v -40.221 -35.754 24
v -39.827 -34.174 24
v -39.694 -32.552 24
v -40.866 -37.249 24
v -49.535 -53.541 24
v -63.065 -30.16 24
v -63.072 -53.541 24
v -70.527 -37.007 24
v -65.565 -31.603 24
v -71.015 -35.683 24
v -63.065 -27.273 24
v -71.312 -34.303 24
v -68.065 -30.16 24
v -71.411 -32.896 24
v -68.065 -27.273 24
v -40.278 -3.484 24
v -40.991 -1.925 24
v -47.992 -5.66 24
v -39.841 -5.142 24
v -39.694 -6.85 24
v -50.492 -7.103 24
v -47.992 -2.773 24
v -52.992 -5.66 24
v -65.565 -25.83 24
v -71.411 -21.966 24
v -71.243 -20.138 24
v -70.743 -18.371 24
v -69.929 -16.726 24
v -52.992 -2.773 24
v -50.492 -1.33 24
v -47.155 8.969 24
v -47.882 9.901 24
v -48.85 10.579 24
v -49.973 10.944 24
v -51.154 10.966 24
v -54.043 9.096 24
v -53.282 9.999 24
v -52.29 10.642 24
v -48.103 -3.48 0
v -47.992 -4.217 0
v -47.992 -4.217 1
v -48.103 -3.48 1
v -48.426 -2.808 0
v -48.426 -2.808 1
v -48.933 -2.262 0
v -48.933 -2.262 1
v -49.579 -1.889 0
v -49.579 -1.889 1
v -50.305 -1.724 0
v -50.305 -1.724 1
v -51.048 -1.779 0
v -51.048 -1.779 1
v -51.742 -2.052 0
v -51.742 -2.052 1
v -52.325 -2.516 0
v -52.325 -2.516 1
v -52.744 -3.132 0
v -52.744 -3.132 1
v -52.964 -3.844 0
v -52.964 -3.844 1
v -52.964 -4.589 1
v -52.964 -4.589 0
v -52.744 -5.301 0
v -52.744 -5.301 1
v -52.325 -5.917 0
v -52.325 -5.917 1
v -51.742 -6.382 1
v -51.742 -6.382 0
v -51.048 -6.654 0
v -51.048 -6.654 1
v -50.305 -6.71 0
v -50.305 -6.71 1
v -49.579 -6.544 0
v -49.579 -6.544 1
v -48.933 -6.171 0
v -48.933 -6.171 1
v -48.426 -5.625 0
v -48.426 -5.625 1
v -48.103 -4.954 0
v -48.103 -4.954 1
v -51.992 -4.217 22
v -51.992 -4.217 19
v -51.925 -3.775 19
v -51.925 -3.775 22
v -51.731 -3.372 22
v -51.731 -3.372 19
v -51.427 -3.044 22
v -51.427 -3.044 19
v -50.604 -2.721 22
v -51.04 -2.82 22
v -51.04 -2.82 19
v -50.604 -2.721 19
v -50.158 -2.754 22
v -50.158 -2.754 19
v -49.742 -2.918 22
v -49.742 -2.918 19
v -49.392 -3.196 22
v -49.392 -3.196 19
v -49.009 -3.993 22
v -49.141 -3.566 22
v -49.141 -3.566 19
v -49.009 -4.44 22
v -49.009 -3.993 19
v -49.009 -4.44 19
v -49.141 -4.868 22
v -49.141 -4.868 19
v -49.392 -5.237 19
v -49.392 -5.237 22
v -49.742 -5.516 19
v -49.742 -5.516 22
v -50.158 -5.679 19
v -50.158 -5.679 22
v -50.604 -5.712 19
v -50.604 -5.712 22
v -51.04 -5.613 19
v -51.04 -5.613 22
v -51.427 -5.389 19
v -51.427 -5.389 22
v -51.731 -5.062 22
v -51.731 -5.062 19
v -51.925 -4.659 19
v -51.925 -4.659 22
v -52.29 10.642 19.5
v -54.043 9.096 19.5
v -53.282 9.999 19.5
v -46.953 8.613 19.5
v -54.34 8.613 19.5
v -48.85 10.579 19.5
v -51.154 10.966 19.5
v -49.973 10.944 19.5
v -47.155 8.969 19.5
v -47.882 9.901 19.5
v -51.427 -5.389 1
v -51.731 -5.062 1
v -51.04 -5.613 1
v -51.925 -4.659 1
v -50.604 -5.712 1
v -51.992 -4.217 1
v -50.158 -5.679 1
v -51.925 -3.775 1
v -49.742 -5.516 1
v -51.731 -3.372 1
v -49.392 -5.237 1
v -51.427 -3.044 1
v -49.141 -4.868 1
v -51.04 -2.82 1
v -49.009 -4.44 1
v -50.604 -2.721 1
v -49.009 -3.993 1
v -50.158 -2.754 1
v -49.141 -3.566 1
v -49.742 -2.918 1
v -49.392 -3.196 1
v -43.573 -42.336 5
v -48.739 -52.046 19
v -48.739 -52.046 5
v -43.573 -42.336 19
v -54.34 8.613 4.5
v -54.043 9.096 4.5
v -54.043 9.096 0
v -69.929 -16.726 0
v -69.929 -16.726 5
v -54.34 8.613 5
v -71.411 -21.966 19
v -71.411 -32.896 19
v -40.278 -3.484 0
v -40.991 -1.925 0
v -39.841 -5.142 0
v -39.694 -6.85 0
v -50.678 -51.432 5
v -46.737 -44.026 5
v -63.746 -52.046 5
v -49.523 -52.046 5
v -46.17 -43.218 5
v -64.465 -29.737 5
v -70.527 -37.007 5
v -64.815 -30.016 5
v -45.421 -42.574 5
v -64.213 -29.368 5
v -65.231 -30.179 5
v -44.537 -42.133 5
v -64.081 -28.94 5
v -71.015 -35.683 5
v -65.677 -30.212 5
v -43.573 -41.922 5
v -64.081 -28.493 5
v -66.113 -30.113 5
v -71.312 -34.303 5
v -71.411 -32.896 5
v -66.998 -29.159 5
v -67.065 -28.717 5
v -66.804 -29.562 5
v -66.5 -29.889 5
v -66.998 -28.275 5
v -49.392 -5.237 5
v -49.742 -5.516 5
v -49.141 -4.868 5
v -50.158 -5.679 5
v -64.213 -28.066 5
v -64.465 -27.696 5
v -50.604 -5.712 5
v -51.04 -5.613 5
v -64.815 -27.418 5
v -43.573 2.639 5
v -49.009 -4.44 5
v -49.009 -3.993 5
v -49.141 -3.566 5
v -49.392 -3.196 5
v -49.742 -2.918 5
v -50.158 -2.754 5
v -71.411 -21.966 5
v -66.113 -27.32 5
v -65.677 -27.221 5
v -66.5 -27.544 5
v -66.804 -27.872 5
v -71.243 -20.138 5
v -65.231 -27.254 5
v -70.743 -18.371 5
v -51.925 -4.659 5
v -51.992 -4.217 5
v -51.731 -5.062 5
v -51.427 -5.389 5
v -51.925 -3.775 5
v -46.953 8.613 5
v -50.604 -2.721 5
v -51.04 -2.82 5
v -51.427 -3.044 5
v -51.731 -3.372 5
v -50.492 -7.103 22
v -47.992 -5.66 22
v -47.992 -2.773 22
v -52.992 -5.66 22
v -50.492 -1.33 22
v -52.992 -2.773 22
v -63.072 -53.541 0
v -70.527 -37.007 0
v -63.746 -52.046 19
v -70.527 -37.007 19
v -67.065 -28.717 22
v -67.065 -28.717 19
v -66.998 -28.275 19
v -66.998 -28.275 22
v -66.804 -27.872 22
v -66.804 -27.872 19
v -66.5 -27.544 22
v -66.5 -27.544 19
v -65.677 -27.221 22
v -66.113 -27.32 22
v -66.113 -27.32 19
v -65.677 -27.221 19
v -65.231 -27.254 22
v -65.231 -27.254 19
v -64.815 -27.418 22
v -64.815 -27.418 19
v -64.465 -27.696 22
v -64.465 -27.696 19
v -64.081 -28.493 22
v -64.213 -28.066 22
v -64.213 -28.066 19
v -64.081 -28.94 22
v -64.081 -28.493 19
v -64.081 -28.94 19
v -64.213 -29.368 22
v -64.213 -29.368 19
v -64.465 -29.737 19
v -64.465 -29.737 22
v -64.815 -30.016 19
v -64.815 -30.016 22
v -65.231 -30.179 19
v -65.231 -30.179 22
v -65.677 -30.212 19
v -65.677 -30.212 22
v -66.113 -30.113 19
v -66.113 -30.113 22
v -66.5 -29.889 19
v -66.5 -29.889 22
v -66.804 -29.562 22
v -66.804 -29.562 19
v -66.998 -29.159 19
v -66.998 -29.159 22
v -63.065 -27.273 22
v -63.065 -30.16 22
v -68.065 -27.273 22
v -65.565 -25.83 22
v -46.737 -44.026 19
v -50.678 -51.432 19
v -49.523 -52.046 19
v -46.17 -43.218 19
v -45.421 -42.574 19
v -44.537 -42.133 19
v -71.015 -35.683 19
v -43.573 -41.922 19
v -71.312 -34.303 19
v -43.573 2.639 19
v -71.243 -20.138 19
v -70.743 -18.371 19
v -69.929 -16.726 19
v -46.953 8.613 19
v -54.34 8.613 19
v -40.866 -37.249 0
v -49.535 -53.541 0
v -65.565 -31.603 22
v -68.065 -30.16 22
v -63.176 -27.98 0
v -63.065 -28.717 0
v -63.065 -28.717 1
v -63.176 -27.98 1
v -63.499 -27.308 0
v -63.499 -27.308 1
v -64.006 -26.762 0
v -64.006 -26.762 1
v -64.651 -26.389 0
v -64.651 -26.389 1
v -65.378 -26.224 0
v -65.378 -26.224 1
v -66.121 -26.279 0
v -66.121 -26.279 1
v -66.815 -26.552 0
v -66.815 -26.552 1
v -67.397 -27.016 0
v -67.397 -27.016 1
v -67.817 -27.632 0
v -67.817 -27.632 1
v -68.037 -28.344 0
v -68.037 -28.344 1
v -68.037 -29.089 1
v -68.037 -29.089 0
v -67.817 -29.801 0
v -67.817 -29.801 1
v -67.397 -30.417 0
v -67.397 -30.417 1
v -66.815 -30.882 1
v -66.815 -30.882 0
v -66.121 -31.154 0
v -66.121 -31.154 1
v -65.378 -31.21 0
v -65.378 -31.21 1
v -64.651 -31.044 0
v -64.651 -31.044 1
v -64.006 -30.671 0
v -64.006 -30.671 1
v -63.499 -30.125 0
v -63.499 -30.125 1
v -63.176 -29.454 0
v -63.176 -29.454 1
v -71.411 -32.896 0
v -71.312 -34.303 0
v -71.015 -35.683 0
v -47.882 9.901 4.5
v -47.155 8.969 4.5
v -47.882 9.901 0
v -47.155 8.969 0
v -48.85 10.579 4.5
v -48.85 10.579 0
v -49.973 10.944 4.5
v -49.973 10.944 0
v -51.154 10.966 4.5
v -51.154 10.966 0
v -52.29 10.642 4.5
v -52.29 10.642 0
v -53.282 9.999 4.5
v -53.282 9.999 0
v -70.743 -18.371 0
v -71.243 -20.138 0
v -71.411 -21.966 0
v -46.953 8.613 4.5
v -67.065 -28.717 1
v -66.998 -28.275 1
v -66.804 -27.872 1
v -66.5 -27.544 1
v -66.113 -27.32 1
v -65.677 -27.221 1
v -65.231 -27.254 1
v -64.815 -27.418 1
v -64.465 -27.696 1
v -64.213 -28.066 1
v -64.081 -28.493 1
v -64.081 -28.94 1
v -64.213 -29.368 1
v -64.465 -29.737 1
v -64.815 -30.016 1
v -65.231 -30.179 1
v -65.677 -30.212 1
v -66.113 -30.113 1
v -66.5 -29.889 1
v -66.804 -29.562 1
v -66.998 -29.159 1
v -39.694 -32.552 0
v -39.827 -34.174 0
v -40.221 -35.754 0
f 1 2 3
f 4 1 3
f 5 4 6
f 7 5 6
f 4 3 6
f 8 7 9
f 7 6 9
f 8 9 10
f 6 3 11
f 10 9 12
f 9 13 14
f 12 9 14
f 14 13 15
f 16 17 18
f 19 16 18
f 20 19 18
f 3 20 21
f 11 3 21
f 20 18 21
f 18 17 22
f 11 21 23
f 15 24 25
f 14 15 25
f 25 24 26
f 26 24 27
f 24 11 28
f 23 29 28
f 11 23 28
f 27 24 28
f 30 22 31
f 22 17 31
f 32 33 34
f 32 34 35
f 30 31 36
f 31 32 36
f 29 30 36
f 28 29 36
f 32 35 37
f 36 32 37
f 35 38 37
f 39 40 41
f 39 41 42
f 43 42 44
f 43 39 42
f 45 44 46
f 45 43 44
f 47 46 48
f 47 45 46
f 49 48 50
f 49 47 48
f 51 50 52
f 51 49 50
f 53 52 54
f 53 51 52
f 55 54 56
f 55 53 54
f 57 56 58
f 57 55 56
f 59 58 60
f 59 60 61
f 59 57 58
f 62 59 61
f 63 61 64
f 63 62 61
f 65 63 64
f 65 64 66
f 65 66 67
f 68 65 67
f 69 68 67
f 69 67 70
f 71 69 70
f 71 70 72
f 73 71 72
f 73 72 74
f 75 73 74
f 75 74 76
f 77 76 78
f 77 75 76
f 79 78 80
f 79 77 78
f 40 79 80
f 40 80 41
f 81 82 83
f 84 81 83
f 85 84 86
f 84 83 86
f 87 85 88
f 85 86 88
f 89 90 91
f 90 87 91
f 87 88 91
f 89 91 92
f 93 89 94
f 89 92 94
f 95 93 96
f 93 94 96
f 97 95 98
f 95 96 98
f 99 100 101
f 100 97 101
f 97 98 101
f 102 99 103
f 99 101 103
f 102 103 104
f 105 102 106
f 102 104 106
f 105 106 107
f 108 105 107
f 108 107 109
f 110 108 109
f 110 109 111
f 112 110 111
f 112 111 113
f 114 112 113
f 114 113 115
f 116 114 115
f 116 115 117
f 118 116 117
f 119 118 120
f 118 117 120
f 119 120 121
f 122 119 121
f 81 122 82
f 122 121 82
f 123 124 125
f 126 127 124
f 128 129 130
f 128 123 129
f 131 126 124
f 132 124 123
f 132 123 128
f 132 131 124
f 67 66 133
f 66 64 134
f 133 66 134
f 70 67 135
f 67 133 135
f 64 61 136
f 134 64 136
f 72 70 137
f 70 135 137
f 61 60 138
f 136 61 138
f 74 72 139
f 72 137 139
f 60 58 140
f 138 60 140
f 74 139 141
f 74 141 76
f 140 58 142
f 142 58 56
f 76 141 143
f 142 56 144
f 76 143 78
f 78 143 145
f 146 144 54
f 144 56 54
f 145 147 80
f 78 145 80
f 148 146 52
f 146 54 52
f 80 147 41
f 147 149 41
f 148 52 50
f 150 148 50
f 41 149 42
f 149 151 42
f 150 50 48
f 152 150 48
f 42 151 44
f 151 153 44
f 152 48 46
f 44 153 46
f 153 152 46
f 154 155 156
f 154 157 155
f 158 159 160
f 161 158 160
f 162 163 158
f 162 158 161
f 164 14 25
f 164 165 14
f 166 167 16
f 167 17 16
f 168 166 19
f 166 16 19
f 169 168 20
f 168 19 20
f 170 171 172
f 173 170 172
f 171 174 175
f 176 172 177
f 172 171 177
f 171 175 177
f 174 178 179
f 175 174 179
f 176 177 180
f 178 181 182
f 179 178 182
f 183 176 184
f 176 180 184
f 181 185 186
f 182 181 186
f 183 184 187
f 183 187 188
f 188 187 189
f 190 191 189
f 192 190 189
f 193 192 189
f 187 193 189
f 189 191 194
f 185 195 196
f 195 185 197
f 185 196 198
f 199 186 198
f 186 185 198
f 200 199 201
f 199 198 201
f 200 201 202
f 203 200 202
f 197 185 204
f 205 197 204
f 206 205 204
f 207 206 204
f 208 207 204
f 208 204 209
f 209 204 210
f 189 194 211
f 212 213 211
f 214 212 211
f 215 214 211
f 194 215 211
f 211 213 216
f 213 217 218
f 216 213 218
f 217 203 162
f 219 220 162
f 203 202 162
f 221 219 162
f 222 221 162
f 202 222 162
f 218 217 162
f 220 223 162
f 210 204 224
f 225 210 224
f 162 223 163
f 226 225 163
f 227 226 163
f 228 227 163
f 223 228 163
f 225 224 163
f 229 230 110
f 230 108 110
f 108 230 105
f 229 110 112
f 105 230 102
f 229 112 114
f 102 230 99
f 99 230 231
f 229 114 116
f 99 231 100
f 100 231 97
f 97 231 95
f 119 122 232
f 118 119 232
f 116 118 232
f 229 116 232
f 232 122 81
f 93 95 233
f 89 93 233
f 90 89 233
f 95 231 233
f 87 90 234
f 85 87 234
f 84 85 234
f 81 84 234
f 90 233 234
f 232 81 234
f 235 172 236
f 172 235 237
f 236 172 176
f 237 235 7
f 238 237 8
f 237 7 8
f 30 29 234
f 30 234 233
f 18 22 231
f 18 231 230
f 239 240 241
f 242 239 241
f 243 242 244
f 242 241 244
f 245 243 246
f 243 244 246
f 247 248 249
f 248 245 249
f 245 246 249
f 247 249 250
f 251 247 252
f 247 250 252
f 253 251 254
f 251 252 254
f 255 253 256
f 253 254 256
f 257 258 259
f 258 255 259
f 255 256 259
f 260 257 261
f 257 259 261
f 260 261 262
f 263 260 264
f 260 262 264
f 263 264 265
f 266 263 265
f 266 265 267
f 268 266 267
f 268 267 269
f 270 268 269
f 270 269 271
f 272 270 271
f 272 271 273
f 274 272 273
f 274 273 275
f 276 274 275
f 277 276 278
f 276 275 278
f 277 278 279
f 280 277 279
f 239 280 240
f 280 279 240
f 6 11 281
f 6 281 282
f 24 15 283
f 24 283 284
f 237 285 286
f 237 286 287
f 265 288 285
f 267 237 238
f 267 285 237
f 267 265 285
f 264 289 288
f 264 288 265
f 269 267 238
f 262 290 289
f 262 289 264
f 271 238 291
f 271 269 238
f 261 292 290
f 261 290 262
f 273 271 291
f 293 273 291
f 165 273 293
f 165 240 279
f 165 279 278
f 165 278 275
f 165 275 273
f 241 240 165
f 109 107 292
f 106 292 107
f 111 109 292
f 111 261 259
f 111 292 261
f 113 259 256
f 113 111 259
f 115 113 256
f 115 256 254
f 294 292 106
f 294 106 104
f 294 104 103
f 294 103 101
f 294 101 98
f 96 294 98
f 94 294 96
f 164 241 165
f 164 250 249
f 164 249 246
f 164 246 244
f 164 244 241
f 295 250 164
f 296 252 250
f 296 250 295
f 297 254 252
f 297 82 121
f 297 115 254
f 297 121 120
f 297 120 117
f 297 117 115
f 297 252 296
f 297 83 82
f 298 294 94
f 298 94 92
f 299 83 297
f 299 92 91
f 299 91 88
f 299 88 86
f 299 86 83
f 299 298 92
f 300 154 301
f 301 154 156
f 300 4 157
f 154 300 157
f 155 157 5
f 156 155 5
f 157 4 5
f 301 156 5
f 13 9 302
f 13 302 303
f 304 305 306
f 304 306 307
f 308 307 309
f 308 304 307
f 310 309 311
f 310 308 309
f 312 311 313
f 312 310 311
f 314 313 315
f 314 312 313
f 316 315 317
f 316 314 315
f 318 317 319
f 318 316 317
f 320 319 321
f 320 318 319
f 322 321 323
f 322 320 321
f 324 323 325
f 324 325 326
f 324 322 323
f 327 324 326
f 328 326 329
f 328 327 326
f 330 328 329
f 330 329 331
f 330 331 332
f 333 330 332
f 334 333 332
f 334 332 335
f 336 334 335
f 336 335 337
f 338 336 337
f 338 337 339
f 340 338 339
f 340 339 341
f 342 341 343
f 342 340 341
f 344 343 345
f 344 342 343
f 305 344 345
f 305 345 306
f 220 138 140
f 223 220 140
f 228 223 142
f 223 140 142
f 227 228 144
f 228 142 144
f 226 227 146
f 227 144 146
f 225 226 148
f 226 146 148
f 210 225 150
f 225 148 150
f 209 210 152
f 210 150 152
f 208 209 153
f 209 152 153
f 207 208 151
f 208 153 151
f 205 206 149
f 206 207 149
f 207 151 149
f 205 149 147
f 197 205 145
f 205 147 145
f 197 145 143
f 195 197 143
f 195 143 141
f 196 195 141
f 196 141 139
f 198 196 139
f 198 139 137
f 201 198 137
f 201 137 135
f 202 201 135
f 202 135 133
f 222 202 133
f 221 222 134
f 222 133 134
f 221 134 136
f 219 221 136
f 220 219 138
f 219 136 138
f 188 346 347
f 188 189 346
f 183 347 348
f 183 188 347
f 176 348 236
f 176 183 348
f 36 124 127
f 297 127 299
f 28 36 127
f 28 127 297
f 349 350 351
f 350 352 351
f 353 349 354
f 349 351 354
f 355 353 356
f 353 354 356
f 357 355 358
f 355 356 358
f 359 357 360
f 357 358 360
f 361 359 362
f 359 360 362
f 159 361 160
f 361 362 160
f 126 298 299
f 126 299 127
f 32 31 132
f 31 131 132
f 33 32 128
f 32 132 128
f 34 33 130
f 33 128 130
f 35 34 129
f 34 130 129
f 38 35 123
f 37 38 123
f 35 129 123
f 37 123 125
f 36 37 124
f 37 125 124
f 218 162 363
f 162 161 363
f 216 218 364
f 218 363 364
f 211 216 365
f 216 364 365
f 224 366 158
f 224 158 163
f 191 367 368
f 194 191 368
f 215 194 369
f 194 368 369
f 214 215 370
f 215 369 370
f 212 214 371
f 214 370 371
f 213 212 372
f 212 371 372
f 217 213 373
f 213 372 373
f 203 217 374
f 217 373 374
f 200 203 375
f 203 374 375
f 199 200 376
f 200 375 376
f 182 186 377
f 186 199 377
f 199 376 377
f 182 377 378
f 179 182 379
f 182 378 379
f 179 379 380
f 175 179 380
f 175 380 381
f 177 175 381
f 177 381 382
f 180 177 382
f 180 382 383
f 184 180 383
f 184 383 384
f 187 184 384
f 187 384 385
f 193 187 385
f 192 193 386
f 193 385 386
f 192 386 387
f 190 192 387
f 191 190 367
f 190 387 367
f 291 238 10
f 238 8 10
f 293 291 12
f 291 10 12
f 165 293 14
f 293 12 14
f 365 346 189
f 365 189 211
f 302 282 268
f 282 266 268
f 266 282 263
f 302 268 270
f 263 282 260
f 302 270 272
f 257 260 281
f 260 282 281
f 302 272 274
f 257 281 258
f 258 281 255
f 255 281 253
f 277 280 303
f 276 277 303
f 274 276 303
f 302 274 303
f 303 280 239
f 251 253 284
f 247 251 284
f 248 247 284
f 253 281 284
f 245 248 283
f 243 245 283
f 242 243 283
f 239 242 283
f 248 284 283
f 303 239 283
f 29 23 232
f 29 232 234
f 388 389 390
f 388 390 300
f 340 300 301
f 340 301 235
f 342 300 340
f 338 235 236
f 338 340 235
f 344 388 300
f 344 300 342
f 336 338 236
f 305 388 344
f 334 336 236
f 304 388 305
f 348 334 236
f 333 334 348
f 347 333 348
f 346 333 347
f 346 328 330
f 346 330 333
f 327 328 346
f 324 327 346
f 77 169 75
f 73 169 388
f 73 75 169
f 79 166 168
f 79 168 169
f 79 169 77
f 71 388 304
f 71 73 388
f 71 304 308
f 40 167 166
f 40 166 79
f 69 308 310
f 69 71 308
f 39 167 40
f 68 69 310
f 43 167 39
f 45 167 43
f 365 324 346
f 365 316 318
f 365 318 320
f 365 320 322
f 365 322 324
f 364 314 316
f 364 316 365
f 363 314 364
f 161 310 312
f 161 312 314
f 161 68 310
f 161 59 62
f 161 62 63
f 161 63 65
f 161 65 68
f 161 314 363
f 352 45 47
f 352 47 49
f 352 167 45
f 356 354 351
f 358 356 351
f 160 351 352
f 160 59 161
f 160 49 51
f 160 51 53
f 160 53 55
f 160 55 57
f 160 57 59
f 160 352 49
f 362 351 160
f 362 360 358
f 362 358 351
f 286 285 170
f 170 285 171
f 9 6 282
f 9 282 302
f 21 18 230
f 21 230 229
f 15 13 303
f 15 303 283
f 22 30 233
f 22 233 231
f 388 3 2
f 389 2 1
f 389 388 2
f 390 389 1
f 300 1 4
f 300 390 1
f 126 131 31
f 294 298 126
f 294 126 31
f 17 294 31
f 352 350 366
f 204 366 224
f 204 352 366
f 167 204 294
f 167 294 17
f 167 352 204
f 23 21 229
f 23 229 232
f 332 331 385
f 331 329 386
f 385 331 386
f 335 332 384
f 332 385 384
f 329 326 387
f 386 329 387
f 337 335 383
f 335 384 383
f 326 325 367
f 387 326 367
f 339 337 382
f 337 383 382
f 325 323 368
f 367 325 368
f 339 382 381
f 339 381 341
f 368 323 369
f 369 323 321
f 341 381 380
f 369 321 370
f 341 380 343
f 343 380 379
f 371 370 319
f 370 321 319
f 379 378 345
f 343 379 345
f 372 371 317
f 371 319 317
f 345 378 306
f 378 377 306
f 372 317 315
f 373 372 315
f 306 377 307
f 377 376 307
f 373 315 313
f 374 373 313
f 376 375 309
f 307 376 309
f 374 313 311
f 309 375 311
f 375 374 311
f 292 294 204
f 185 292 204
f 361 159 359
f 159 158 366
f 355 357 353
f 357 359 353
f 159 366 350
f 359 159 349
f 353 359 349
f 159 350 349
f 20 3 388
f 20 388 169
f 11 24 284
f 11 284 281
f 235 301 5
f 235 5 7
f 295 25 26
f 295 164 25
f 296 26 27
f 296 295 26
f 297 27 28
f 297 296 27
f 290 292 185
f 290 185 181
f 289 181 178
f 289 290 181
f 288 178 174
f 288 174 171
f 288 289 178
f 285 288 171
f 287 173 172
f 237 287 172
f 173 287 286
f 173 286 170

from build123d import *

# Parameters (mm, degrees)
SKETCH_1_W           = 41.838517058
SKETCH_1_H           = 61.659283987
SKETCH_1_R           = 1.5
EXTRUDE_1_DEPTH      = 24
SHELL_START          = 5
SHELL_2_OUTLINE_R    = 6.5
SHELL_2_DEPTH        = 14
SKETCH_7_W           = 14
SKETCH_7_H           = 61.659283987
CUT_EXTRUDE_2_DEPTH  = 38
SKETCH_11_W          = 14
SKETCH_11_H          = 61.659283987
EXTRUDE_2_DEPTH      = 14
SKETCH_12_W          = 10.1213772
SKETCH_12_H          = 61.659283987
CUT_EXTRUDE_3_DEPTH  = 52.896145639
CUT_EXTRUDE_5_DEPTH  = 47.819908548
SKETCH_18_W          = 15
SKETCH_18_H          = 18
CUT_EXTRUDE_6_DEPTH  = 54.011520411
EXTRUDE_5_DEPTH      = 24
SKETCH_22_W          = 27.838517058
SKETCH_22_H          = 14
CUT_EXTRUDE_8_DEPTH  = 17
SKETCH_23_W          = 14.991158549
SKETCH_23_H          = 11.73336261
EXTRUDE_8_DEPTH      = 2
FILLET_3_R           = 4
CUT_EXTRUDE_9_DEPTH  = 62.891048756
FILLET_4_R           = 4
FILLET_5_R           = 10
CUT_EXTRUDE_10_DEPTH = 2
SKETCH_26_R          = 2.5
CUT_EXTRUDE_11_DEPTH = 1


# Read off the part's stored shape, not the designer's step: 抽壳2
with BuildPart() as part:
    # 草图1 → 凸台-拉伸1 (new body)
    with BuildSketch(Plane.XY):
        with Locations((-8.896267572, -4.216675009)):
            Rectangle(SKETCH_1_W, SKETCH_1_H)
        with Locations((-8.896267572, -4.21667501)):
            Circle(SKETCH_1_R, mode=Mode.SUBTRACT)
        with Locations((6.176232993, -28.71667501)):
            Circle(SKETCH_1_R, mode=Mode.SUBTRACT)
    extrude(amount=EXTRUDE_1_DEPTH)

    # 抽壳2 outline → 抽壳2 (cut)
    # profile 1 of 2: a face of its own
    with BuildSketch(Plane.XY.offset(SHELL_START)):
        with BuildLine():
            Line((-24.815526101, 26.612966984), (-24.815526101, -35.046317003))
            Line((-24.815526101, -35.046317003), (4.697844602, -35.046317003))
            ThreePointArc((4.697844602, -35.046317003), (1.097738874, -24.659718332), (12.022990957, -25.876706469))
            Line((12.022990957, -25.876706469), (12.022990957, 26.612966984))
            Line((12.022990957, 26.612966984), (-24.815526101, 26.612966984))
        make_face()
        with Locations((-8.896267572, -4.21667501)):
            Circle(SHELL_2_OUTLINE_R, mode=Mode.SUBTRACT)
    # profile 2 of 2: a face of its own
    with BuildSketch(Plane.XY.offset(SHELL_START)):
        with BuildLine():
            ThreePointArc((12.022990957, -31.556643551), (10.23318967, -33.795169129), (7.654621384, -35.046317003))
            Line((7.654621384, -35.046317003), (12.022990957, -35.046317003))
            Line((12.022990957, -35.046317003), (12.022990957, -31.556643551))
        make_face()
    extrude(amount=SHELL_2_DEPTH, mode=Mode.SUBTRACT)

    # 草图7 → 切除-拉伸2 (cut)
    with BuildSketch(Plane(origin=(12.022990957, 0, 0), x_dir=(0, 0, -1), z_dir=(1, 0, 0))):
        with Locations((-12, -4.216675009)):
            Rectangle(SKETCH_7_W, SKETCH_7_H)
    extrude(amount=-CUT_EXTRUDE_2_DEPTH, mode=Mode.SUBTRACT)

    # 草图11 → 凸台-拉伸2 (add)
    with BuildSketch(Plane.ZY.offset(29.815526101)):
        with Locations((12, -4.216675009)):
            Rectangle(SKETCH_11_W, SKETCH_11_H)
    extrude(amount=-EXTRUDE_2_DEPTH)

    # 草图12 → 切除-拉伸3 (cut, through all)
    with BuildSketch(Plane.XY.offset(24)):
        with Locations((-24.754837501, -4.216675009)):
            Rectangle(SKETCH_12_W, SKETCH_12_H)
    extrude(amount=-CUT_EXTRUDE_3_DEPTH, mode=Mode.SUBTRACT)

    # 草图17 → 切除-拉伸5 (cut, through all)
    with BuildSketch(Plane.XY.offset(24)):
        Polygon((-8.896267572, 26.612966984), (-8.896267572, 14.867807771), (12.022990957, -19.135961659), (12.022990957, 26.612966984), align=None)
    extrude(amount=-CUT_EXTRUDE_5_DEPTH, mode=Mode.SUBTRACT)

    # 草图18 → 切除-拉伸6 (cut, through all)
    with BuildSketch(Plane.ZY.offset(19.694148901)):
        with Locations((12, 17.612966984)):
            Rectangle(SKETCH_18_W, SKETCH_18_H)
    extrude(amount=-CUT_EXTRUDE_6_DEPTH, mode=Mode.SUBTRACT)

    # 草图20 → 凸台-拉伸5 (add)
    with BuildSketch(Plane.XY.offset(24)):
        Polygon((-19.694148901, -35.046317003), (-9.853501275, -53.541034872), (3.683563025, -53.541034872), (12.022990957, -35.046317003), align=None)
    extrude(amount=-EXTRUDE_5_DEPTH)

    # 草图22 → 切除-拉伸8 (cut)
    with BuildSketch(Plane(origin=(0, -35.046317003, 0), x_dir=(1, 0, 0), z_dir=(0, 1, 0))):
        with Locations((-1.896267572, -12)):
            Rectangle(SKETCH_22_W, SKETCH_22_H)
    extrude(amount=-CUT_EXTRUDE_8_DEPTH, mode=Mode.SUBTRACT)

    # 草图23 → 凸台-拉伸8 (add)
    with BuildSketch(Plane(origin=(-29.881783728, -15.899464172, 0), x_dir=(0, 0, -1), z_dir=(0.8828123820911005, 0.469725768961675, 0))):
        with Locations((-11.904751729, -35.446570554)):
            Rectangle(SKETCH_23_W, SKETCH_23_H)
    extrude(amount=EXTRUDE_8_DEPTH)

    # 圆角3
    # the kernel refuses this fillet: 4 mm, written as the material it takes off along each edge
    with BuildSketch(Plane(origin=(-14.221722741, -41.073505124, 19), x_dir=(-0.8828123820904301, -0.4697257689629349, 0), z_dir=(0, 0, -1))) as fillet_3_piece_1:
        with BuildLine():
            CenterArc((4, -3.344189139), FILLET_3_R, 123.274953356, 56.725046644)
            Line((0, -3.344189139), (-0.08, -3.344189139))
            Line((-0.08, -3.344189139), (-0.08, 0))
            Line((-0.08, 0), (0, 0.08))
            ThreePointArc((0, 0.08), (0.902685209, 0.08), (1.761477827, 0.066883783))
            Line((1.761477827, 0.066883783), (1.805370419, 0))
        make_face()
    extrude(amount=14, mode=Mode.SUBTRACT)

    # 草图24 → 切除-拉伸9 (cut, through all)
    with BuildSketch(Plane(origin=(0, 0, 0), x_dir=(-1, 0, 0), z_dir=(0, 0, -1))):
        Polygon((8.896267572, 14.867807771), (19.694148901, -4.21667501), (19.694148901, 26.612966984), (8.896267572, 26.612966984), align=None)
    extrude(amount=-CUT_EXTRUDE_9_DEPTH, mode=Mode.SUBTRACT)

    # 圆角4
    fillet_4_edges = [part.edges().sort_by_distance(p)[0] for p in [
        (-8.896267572, 14.867807771, 2.25),
        (-8.896267572, 14.867807771, 21.75),
    ]]
    fillet(fillet_4_edges, radius=FILLET_4_R)

    # 圆角5
    fillet_5_edges = [part.edges().sort_by_distance(p)[0] for p in [
        (-19.694148901, -35.046317003, 12),
        (12.022990957, -19.135961659, 2.5),
        (12.022990957, -19.135961659, 21.5),
        (12.022990957, -35.046317003, 2.5),
        (-19.694148901, -4.21667501, 12),
        (12.022990957, -35.046317003, 21.5),
    ]]
    fillet(fillet_5_edges, radius=FILLET_5_R)

    # 草图25 → 切除-拉伸10 (cut)
    with BuildSketch(Plane.XY.offset(24)):
        Polygon((-8.896267572, -7.103426356), (-6.396267572, -5.660050683), (-6.396267572, -2.773299337), (-8.896267572, -1.329923664), (-11.396267572, -2.773299337), (-11.396267572, -5.660050683), align=None)
        Polygon((6.176232993, -25.829923664), (3.676232993, -27.273299337), (3.676232993, -30.160050683), (6.176232993, -31.603426356), (8.676232993, -30.160050683), (8.676232993, -27.273299337), align=None)
    extrude(amount=-CUT_EXTRUDE_10_DEPTH, mode=Mode.SUBTRACT)

    # 草图26 → 切除-拉伸11 (cut)
    with BuildSketch(Plane(origin=(0, 0, 0), x_dir=(-1, 0, 0), z_dir=(0, 0, -1))):
        with Locations((8.896267572, -4.21667501)):
            Circle(SKETCH_26_R)
        with Locations((-6.176232993, -28.71667501)):
            Circle(SKETCH_26_R)
    extrude(amount=-CUT_EXTRUDE_11_DEPTH, mode=Mode.SUBTRACT)


with BuildPart() as body_2:
    # 镜向1: mirrored copy
    add(part.part.mirror(Plane.ZY.offset(29.694148901)))


solid = body_2.part
